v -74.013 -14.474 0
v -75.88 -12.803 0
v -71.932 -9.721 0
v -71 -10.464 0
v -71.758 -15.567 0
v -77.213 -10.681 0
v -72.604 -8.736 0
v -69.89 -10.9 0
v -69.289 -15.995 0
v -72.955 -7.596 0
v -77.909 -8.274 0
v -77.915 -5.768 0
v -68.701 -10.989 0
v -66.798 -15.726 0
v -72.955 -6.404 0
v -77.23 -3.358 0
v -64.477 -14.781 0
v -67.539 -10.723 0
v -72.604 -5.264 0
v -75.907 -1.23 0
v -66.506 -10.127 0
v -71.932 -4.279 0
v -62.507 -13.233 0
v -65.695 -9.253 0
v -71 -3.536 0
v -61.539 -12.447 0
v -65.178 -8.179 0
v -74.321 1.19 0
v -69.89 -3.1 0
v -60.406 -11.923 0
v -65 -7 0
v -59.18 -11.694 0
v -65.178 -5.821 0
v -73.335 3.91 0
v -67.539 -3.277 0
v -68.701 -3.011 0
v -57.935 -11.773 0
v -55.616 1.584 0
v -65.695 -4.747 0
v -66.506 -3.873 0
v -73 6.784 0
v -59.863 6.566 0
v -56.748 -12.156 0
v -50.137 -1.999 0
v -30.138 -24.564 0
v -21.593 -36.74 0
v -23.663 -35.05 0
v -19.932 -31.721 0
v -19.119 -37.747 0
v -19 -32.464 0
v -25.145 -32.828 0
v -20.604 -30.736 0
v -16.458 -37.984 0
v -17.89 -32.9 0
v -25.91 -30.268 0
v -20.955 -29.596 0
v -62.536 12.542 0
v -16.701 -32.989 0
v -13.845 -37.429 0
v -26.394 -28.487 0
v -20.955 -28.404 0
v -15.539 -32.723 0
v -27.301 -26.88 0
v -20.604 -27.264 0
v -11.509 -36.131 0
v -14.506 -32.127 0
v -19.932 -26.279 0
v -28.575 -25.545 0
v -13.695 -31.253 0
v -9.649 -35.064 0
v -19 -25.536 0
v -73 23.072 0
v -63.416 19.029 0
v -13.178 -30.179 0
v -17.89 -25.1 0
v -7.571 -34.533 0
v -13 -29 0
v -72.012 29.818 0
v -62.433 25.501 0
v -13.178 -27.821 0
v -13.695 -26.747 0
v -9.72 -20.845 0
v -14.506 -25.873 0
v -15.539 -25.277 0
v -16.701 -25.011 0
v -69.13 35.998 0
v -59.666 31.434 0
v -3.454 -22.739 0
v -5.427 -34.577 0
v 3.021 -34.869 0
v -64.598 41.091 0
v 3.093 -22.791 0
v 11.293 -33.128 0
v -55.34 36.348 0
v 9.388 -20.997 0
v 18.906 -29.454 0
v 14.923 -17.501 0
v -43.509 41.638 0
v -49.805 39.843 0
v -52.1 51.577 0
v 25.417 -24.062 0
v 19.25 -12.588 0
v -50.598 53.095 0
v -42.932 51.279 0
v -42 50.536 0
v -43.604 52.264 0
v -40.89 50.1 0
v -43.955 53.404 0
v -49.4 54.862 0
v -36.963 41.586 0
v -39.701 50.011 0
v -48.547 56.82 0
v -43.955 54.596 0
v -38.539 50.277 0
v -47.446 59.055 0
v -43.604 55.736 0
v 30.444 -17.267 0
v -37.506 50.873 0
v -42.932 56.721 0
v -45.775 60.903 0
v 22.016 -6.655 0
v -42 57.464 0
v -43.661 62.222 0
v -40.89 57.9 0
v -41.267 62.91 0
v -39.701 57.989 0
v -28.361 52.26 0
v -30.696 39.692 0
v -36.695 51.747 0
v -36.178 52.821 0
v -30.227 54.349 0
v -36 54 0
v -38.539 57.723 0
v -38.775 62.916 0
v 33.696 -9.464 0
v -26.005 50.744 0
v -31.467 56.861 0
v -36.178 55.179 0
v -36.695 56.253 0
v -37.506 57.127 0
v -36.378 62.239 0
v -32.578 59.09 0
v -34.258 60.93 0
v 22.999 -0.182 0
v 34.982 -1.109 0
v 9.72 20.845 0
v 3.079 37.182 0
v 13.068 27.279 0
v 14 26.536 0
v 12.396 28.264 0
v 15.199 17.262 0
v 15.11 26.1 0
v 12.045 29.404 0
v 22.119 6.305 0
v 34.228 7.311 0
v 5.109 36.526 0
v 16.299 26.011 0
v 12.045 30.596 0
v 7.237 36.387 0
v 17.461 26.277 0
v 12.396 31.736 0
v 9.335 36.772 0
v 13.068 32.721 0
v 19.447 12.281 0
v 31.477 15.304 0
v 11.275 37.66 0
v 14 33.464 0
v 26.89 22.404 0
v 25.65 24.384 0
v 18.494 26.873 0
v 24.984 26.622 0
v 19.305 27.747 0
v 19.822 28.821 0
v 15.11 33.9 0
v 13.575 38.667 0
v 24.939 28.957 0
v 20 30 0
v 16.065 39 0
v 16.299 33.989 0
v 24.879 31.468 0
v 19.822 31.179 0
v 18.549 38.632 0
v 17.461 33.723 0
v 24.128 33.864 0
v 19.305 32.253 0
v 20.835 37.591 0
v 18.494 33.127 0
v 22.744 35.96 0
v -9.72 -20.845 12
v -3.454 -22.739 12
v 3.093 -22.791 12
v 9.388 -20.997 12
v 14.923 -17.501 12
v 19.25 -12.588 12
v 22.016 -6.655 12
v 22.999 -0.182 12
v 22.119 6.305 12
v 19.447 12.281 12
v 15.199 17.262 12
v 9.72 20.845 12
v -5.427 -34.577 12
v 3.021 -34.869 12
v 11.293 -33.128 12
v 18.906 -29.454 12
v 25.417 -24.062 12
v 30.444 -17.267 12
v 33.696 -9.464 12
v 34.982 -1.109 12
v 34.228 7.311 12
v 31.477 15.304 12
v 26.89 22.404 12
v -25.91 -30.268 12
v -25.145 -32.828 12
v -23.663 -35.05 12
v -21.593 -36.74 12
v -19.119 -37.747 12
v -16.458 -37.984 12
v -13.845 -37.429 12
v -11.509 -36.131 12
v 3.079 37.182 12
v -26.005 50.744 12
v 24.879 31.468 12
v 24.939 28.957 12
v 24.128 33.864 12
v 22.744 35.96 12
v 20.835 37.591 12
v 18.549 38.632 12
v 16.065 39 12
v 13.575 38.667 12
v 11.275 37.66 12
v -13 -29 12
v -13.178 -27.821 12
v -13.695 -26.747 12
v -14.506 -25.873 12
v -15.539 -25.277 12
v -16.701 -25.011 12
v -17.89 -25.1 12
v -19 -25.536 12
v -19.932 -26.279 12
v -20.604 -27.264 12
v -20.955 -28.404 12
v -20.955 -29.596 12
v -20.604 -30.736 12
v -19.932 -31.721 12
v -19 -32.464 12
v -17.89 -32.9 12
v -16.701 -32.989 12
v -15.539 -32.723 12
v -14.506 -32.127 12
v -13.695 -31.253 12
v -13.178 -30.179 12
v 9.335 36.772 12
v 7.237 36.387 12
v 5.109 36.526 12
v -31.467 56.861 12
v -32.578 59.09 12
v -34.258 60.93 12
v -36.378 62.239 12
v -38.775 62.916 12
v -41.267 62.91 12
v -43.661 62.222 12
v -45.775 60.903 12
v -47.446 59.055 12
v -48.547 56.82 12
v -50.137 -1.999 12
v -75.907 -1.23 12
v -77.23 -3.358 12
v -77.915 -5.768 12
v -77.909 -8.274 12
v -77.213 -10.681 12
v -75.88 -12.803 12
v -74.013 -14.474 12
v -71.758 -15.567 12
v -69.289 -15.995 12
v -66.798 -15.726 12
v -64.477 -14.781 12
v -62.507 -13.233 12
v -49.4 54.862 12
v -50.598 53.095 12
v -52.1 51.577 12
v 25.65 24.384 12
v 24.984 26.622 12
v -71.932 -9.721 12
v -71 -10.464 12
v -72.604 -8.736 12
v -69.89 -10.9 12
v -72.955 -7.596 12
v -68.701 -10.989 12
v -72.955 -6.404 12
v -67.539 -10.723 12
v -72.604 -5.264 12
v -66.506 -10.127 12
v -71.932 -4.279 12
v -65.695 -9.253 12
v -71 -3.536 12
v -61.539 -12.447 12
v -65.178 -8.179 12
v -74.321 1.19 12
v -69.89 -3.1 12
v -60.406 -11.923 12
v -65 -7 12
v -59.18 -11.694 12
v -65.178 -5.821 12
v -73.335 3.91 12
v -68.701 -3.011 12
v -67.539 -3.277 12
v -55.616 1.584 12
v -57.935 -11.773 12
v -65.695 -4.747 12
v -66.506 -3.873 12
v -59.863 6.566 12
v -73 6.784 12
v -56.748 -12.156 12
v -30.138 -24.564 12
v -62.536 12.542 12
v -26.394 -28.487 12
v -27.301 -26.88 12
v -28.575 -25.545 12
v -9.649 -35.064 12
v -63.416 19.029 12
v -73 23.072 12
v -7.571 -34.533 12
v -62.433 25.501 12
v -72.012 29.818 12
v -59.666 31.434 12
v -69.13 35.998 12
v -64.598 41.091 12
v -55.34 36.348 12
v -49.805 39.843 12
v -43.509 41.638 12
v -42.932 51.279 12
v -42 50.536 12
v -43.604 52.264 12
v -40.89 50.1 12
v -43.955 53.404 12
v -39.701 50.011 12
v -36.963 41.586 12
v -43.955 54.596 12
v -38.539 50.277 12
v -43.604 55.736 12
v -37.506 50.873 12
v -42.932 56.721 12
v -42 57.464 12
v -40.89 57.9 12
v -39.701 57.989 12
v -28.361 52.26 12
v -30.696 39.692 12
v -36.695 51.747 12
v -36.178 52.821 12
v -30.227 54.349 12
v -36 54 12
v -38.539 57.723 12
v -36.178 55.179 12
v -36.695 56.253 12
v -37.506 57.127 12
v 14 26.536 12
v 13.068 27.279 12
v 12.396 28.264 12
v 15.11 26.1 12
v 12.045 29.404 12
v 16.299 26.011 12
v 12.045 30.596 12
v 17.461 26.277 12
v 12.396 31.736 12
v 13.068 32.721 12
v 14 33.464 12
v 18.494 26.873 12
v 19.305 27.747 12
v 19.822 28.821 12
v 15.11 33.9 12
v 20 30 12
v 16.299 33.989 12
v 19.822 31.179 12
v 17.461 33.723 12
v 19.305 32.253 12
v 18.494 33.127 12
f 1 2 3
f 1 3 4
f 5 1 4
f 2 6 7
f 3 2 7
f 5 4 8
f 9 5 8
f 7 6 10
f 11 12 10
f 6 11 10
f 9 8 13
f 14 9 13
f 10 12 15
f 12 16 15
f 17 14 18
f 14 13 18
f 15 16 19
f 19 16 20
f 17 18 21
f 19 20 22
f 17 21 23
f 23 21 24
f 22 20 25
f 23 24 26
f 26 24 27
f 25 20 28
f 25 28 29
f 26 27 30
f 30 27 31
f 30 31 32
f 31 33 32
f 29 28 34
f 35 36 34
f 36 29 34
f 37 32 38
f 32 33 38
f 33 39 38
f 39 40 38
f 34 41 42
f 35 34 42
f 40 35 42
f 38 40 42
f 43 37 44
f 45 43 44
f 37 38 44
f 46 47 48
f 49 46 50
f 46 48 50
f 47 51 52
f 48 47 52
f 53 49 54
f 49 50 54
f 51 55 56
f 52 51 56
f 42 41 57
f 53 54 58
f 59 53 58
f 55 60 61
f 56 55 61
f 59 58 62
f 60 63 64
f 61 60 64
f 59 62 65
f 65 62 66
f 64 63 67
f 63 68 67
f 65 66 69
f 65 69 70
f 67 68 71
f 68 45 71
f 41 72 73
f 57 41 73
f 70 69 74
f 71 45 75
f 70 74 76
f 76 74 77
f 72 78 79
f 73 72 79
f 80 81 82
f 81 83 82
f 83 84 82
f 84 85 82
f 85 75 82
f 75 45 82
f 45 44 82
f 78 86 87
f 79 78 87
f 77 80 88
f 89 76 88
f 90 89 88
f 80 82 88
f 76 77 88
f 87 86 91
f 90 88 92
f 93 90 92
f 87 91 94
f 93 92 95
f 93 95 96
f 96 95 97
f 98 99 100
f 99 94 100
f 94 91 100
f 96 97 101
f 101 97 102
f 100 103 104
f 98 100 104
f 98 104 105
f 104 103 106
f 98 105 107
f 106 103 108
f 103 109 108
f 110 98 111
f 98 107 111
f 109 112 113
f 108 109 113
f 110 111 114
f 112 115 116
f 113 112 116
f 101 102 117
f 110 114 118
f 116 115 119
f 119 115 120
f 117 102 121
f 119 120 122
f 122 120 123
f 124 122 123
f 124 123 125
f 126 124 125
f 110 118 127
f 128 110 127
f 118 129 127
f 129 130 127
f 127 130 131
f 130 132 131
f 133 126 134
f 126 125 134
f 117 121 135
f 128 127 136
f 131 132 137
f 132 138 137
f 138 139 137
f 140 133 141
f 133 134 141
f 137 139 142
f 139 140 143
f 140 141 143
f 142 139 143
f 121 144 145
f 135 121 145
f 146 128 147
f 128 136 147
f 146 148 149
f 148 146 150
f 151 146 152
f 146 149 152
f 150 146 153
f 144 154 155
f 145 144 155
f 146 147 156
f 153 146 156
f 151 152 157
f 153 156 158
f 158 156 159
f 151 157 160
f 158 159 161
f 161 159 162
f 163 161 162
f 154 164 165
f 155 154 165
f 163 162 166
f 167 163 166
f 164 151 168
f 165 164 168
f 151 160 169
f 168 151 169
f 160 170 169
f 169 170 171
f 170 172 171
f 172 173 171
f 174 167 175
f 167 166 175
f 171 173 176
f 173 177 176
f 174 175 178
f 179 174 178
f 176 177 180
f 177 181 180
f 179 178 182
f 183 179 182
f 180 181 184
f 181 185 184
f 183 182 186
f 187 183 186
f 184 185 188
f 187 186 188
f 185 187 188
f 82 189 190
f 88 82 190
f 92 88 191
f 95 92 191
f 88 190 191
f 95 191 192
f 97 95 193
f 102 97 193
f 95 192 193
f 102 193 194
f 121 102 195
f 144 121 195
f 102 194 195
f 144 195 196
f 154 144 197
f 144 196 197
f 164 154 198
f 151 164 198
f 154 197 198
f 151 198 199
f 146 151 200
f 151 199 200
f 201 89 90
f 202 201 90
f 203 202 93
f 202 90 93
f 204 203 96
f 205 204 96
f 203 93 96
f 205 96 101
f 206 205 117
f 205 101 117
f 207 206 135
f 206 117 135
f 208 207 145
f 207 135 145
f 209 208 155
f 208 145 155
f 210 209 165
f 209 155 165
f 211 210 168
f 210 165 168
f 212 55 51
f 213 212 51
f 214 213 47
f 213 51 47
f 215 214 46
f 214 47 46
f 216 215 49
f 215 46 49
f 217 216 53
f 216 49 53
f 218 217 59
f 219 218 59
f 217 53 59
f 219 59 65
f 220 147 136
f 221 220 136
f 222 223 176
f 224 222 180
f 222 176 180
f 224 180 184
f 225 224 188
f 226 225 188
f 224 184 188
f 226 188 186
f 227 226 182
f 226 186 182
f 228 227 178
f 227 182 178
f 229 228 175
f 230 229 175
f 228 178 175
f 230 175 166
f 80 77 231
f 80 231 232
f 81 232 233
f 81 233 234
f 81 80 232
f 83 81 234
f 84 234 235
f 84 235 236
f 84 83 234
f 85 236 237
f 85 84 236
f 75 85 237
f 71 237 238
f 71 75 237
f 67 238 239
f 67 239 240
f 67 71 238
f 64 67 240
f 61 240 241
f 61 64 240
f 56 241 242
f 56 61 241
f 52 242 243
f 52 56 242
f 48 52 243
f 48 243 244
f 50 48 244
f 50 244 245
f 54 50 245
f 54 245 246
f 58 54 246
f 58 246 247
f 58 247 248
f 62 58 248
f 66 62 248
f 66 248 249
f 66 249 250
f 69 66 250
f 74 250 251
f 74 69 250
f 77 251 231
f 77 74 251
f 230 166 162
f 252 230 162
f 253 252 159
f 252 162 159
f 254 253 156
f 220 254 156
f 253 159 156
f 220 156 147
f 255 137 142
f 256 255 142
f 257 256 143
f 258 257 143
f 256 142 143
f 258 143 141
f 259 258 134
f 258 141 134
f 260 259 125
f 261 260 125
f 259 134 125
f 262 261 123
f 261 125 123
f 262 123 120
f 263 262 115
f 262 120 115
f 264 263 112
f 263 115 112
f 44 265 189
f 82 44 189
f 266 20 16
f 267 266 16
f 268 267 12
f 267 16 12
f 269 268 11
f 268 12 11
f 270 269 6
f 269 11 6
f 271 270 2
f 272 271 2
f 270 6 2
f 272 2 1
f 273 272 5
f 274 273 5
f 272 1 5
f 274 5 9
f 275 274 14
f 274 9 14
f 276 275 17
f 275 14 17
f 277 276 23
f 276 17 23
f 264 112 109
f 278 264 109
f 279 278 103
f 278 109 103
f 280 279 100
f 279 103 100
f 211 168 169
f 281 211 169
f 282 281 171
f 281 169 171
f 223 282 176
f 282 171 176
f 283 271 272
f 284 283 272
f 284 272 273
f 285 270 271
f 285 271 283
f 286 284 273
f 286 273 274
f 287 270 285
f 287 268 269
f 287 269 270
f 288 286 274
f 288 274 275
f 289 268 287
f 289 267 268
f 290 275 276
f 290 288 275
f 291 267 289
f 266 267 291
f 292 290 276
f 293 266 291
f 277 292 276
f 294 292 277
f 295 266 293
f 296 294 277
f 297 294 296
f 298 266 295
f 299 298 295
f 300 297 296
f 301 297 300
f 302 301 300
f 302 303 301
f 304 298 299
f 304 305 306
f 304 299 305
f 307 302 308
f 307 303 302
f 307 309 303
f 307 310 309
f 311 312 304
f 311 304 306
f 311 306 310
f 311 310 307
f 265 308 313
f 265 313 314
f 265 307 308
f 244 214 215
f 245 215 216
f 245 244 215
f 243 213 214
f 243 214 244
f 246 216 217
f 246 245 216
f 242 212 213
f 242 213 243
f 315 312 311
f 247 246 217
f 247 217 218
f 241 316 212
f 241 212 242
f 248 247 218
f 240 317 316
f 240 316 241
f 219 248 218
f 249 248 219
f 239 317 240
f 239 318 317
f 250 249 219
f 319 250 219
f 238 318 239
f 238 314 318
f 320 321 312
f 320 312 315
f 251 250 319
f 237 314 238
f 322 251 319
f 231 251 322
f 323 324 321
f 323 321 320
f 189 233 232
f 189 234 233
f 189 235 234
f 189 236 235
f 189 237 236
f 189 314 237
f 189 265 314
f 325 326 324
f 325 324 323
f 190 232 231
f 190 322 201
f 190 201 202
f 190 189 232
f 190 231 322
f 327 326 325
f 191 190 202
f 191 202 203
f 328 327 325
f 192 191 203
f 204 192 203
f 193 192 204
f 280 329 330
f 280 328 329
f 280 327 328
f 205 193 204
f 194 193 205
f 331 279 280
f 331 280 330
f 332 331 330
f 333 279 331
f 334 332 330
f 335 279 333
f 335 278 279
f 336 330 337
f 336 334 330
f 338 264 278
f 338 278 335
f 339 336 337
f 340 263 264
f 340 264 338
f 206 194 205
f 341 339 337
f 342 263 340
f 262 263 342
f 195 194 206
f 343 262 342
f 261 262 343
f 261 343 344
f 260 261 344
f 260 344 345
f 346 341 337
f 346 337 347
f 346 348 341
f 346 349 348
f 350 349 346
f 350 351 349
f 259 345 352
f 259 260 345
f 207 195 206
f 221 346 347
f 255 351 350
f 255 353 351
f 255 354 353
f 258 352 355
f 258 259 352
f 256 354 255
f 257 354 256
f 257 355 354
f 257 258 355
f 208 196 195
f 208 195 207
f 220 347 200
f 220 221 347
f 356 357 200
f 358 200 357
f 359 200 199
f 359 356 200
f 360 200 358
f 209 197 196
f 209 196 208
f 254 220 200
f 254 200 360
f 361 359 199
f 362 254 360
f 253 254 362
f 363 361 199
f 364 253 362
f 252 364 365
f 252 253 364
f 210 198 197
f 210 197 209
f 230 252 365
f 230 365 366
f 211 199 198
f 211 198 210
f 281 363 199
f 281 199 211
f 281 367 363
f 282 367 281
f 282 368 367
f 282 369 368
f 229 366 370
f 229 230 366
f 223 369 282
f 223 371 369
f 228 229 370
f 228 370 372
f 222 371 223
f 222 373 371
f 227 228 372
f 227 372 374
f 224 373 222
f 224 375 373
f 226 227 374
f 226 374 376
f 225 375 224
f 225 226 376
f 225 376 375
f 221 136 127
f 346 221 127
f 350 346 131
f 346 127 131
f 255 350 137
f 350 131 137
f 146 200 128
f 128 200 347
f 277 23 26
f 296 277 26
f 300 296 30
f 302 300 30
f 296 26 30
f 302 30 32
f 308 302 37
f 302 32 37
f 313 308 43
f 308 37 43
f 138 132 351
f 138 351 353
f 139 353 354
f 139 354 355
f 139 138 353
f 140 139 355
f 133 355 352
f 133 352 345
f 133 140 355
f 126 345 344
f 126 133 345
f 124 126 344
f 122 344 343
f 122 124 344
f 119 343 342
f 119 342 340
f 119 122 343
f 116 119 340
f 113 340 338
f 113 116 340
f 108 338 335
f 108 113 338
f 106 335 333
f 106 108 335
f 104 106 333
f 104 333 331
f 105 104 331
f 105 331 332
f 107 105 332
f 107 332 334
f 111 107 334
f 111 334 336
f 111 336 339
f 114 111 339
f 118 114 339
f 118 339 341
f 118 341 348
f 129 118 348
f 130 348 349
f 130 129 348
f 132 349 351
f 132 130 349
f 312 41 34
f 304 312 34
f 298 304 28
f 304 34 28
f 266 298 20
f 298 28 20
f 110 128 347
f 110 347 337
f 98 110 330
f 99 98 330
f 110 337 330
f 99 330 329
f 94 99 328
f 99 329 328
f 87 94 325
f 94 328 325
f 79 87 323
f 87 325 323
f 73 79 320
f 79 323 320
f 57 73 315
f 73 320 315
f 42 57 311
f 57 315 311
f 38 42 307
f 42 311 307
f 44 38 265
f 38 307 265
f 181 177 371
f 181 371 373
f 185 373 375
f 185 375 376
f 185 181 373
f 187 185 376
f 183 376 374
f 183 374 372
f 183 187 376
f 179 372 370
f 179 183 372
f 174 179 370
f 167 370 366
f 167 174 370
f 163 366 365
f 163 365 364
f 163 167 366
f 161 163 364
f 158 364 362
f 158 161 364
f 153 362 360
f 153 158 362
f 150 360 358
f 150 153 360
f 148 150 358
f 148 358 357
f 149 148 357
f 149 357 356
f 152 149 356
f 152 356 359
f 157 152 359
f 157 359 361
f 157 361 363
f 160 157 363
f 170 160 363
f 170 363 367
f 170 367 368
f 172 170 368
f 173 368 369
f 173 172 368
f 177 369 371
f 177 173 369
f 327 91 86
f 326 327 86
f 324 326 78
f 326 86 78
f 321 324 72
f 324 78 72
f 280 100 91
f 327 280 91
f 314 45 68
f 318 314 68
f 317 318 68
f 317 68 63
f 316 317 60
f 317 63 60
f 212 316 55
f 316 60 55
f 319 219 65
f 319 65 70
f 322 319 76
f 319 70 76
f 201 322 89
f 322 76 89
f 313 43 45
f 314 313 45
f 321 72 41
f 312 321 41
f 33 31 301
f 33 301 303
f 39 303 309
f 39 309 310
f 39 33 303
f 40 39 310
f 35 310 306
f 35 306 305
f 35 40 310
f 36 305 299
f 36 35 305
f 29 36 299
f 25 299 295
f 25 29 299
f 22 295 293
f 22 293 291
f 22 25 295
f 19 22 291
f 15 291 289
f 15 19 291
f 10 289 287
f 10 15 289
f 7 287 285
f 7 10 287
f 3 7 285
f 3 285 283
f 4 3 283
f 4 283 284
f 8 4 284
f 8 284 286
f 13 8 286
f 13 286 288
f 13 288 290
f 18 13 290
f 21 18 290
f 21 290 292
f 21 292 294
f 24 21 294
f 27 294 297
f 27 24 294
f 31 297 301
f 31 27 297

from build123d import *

# Parameters (mm, degrees)
F0_R     = 4
F1_DEPTH = 12
F5_DEPTH = 25


with BuildPart() as f1:
    # F0 (on Top) → F1 (new body)
    with BuildSketch(Plane.XY):
        with BuildLine():
            ThreePointArc((-26.0048357101, 50.7444812044), (-29.3644274881, 53.2410792158), (-31.4666877274, 56.8605212214))
            ThreePointArc((-31.4666877274, 56.8605212214), (-40.0213923063, 62.999974576), (-48.5468142888, 56.8199229623))
            ThreePointArc((-48.5468142888, 56.8199229623), (-49.9581514965, 53.9510477252), (-52.1002110708, 51.5774642275))
            Line((-52.1002110708, 51.5774642275), (-64.5975648535, 41.0909392778))
            ThreePointArc((-64.5975648535, 41.0909392778), (-70.7961493932, 33.0127866299), (-73, 23.0718589569))
            Line((-73, 23.0718589569), (-73, 6.7840487521))
            ThreePointArc((-73, 6.7840487521), (-73.7491959701, 2.5215841304), (-75.9069767442, -1.2299330805))
            ThreePointArc((-75.9069767442, -1.2299330805), (-75.0048915598, -13.7038255761), (-62.5073050486, -13.2325686734))
            ThreePointArc((-62.5073050486, -13.2325686734), (-59.8003263562, -11.7702356961), (-56.747924728, -12.1562352786))
            Line((-56.747924728, -12.1562352786), (-30.1383846638, -24.5644675905))
            ThreePointArc((-30.1383846638, -24.5644675905), (-27.3013538285, -26.880356732), (-25.9102142317, -30.2681018667))
            ThreePointArc((-25.9102142317, -30.2681018667), (-20.3937217432, -37.3356255152), (-11.5094179528, -36.1311646162))
            ThreePointArc((-11.5094179528, -36.1311646162), (-8.6282643598, -34.7280777032), (-5.4272064645, -34.5766601914))
            ThreePointArc((-5.4272064645, -34.5766601914), (30.4444426556, -17.2666126206), (26.8895951939, 22.4042333122))
            ThreePointArc((26.8895951939, 22.4042333122), (25.241110657, 25.4802972467), (24.9393792274, 28.9571677853))
            ThreePointArc((24.9393792274, 28.9571677853), (20.8346498039, 37.591189714), (11.2748155965, 37.6598062869))
            ThreePointArc((11.2748155965, 37.6598062869), (7.2373944377, 36.3866405331), (3.0794263015, 37.1822670966))
            Line((3.0794263015, 37.1822670966), (-26.0048357101, 50.7444812044))
        make_face()
        with Locations((-69, -7)):
            Circle(F0_R, mode=Mode.SUBTRACT)
        with Locations((-17, -29)):
            Circle(F0_R, mode=Mode.SUBTRACT)
        with BuildLine():
            ThreePointArc((9.72022002, 20.8450791018), (20.8450791018, -9.72022002), (-9.72022002, -20.8450791018))
            Line((-9.72022002, -20.8450791018), (-54.4226364125, 0))
            ThreePointArc((-54.4226364125, 0), (-59.2159612375, 4.203633051), (-61, 10.3243927587))
            Line((-61, 10.3243927587), (-61, 22.8490752496))
            ThreePointArc((-61, 22.8490752496), (-59.8756934444, 27.9204943905), (-56.7134513162, 32.041608567))
            Line((-56.7134513162, 32.041608567), (-43.5116564926, 43.1192297344))
            ThreePointArc((-43.5116564926, 43.1192297344), (-41.4626108227, 44.0208314074), (-39.2500330069, 43.6802831101))
            Line((-39.2500330069, 43.6802831101), (9.72022002, 20.8450791018))
        make_face(mode=Mode.SUBTRACT)
        with Locations((-40, 54)):
            Circle(F0_R, mode=Mode.SUBTRACT)
        with Locations((16, 30)):
            Circle(F0_R, mode=Mode.SUBTRACT)
        with BuildLine():
            Line((-54.4226364125, 0), (-9.72022002, -20.8450791018))
            ThreePointArc((-9.72022002, -20.8450791018), (20.8450791018, -9.72022002), (9.72022002, 20.8450791018))
            Line((9.72022002, 20.8450791018), (-39.2500330069, 43.6802831101))
            ThreePointArc((-39.2500330069, 43.6802831101), (-41.4626108227, 44.0208314074), (-43.5116564926, 43.1192297344))
            Line((-43.5116564926, 43.1192297344), (-56.7134513162, 32.041608567))
            ThreePointArc((-56.7134513162, 32.041608567), (-59.8756934444, 27.9204943905), (-61, 22.8490752496))
            Line((-61, 22.8490752496), (-61, 10.3243927587))
            ThreePointArc((-61, 10.3243927587), (-59.2159612375, 4.203633051), (-54.4226364125, 0))
        make_face()
    extrude(amount=F1_DEPTH)

    # F3 (on offset) → F5 (cut)
    with BuildSketch(Plane.XY.offset(12)):
        with BuildLine():
            Line((9.72022002, 20.8450791018), (-30.6963252268, 39.6916236666))
            ThreePointArc((-30.6963252268, 39.6916236666), (-61.2616243486, 28.5667645848), (-50.1367652668, -1.9985345371))
            Line((-50.1367652668, -1.9985345371), (-9.72022002, -20.8450791018))
            ThreePointArc((-9.72022002, -20.8450791018), (20.8450791018, -9.72022002), (9.72022002, 20.8450791018))
        make_face()
    extrude(amount=-F5_DEPTH, mode=Mode.SUBTRACT)


solid = f1.part
